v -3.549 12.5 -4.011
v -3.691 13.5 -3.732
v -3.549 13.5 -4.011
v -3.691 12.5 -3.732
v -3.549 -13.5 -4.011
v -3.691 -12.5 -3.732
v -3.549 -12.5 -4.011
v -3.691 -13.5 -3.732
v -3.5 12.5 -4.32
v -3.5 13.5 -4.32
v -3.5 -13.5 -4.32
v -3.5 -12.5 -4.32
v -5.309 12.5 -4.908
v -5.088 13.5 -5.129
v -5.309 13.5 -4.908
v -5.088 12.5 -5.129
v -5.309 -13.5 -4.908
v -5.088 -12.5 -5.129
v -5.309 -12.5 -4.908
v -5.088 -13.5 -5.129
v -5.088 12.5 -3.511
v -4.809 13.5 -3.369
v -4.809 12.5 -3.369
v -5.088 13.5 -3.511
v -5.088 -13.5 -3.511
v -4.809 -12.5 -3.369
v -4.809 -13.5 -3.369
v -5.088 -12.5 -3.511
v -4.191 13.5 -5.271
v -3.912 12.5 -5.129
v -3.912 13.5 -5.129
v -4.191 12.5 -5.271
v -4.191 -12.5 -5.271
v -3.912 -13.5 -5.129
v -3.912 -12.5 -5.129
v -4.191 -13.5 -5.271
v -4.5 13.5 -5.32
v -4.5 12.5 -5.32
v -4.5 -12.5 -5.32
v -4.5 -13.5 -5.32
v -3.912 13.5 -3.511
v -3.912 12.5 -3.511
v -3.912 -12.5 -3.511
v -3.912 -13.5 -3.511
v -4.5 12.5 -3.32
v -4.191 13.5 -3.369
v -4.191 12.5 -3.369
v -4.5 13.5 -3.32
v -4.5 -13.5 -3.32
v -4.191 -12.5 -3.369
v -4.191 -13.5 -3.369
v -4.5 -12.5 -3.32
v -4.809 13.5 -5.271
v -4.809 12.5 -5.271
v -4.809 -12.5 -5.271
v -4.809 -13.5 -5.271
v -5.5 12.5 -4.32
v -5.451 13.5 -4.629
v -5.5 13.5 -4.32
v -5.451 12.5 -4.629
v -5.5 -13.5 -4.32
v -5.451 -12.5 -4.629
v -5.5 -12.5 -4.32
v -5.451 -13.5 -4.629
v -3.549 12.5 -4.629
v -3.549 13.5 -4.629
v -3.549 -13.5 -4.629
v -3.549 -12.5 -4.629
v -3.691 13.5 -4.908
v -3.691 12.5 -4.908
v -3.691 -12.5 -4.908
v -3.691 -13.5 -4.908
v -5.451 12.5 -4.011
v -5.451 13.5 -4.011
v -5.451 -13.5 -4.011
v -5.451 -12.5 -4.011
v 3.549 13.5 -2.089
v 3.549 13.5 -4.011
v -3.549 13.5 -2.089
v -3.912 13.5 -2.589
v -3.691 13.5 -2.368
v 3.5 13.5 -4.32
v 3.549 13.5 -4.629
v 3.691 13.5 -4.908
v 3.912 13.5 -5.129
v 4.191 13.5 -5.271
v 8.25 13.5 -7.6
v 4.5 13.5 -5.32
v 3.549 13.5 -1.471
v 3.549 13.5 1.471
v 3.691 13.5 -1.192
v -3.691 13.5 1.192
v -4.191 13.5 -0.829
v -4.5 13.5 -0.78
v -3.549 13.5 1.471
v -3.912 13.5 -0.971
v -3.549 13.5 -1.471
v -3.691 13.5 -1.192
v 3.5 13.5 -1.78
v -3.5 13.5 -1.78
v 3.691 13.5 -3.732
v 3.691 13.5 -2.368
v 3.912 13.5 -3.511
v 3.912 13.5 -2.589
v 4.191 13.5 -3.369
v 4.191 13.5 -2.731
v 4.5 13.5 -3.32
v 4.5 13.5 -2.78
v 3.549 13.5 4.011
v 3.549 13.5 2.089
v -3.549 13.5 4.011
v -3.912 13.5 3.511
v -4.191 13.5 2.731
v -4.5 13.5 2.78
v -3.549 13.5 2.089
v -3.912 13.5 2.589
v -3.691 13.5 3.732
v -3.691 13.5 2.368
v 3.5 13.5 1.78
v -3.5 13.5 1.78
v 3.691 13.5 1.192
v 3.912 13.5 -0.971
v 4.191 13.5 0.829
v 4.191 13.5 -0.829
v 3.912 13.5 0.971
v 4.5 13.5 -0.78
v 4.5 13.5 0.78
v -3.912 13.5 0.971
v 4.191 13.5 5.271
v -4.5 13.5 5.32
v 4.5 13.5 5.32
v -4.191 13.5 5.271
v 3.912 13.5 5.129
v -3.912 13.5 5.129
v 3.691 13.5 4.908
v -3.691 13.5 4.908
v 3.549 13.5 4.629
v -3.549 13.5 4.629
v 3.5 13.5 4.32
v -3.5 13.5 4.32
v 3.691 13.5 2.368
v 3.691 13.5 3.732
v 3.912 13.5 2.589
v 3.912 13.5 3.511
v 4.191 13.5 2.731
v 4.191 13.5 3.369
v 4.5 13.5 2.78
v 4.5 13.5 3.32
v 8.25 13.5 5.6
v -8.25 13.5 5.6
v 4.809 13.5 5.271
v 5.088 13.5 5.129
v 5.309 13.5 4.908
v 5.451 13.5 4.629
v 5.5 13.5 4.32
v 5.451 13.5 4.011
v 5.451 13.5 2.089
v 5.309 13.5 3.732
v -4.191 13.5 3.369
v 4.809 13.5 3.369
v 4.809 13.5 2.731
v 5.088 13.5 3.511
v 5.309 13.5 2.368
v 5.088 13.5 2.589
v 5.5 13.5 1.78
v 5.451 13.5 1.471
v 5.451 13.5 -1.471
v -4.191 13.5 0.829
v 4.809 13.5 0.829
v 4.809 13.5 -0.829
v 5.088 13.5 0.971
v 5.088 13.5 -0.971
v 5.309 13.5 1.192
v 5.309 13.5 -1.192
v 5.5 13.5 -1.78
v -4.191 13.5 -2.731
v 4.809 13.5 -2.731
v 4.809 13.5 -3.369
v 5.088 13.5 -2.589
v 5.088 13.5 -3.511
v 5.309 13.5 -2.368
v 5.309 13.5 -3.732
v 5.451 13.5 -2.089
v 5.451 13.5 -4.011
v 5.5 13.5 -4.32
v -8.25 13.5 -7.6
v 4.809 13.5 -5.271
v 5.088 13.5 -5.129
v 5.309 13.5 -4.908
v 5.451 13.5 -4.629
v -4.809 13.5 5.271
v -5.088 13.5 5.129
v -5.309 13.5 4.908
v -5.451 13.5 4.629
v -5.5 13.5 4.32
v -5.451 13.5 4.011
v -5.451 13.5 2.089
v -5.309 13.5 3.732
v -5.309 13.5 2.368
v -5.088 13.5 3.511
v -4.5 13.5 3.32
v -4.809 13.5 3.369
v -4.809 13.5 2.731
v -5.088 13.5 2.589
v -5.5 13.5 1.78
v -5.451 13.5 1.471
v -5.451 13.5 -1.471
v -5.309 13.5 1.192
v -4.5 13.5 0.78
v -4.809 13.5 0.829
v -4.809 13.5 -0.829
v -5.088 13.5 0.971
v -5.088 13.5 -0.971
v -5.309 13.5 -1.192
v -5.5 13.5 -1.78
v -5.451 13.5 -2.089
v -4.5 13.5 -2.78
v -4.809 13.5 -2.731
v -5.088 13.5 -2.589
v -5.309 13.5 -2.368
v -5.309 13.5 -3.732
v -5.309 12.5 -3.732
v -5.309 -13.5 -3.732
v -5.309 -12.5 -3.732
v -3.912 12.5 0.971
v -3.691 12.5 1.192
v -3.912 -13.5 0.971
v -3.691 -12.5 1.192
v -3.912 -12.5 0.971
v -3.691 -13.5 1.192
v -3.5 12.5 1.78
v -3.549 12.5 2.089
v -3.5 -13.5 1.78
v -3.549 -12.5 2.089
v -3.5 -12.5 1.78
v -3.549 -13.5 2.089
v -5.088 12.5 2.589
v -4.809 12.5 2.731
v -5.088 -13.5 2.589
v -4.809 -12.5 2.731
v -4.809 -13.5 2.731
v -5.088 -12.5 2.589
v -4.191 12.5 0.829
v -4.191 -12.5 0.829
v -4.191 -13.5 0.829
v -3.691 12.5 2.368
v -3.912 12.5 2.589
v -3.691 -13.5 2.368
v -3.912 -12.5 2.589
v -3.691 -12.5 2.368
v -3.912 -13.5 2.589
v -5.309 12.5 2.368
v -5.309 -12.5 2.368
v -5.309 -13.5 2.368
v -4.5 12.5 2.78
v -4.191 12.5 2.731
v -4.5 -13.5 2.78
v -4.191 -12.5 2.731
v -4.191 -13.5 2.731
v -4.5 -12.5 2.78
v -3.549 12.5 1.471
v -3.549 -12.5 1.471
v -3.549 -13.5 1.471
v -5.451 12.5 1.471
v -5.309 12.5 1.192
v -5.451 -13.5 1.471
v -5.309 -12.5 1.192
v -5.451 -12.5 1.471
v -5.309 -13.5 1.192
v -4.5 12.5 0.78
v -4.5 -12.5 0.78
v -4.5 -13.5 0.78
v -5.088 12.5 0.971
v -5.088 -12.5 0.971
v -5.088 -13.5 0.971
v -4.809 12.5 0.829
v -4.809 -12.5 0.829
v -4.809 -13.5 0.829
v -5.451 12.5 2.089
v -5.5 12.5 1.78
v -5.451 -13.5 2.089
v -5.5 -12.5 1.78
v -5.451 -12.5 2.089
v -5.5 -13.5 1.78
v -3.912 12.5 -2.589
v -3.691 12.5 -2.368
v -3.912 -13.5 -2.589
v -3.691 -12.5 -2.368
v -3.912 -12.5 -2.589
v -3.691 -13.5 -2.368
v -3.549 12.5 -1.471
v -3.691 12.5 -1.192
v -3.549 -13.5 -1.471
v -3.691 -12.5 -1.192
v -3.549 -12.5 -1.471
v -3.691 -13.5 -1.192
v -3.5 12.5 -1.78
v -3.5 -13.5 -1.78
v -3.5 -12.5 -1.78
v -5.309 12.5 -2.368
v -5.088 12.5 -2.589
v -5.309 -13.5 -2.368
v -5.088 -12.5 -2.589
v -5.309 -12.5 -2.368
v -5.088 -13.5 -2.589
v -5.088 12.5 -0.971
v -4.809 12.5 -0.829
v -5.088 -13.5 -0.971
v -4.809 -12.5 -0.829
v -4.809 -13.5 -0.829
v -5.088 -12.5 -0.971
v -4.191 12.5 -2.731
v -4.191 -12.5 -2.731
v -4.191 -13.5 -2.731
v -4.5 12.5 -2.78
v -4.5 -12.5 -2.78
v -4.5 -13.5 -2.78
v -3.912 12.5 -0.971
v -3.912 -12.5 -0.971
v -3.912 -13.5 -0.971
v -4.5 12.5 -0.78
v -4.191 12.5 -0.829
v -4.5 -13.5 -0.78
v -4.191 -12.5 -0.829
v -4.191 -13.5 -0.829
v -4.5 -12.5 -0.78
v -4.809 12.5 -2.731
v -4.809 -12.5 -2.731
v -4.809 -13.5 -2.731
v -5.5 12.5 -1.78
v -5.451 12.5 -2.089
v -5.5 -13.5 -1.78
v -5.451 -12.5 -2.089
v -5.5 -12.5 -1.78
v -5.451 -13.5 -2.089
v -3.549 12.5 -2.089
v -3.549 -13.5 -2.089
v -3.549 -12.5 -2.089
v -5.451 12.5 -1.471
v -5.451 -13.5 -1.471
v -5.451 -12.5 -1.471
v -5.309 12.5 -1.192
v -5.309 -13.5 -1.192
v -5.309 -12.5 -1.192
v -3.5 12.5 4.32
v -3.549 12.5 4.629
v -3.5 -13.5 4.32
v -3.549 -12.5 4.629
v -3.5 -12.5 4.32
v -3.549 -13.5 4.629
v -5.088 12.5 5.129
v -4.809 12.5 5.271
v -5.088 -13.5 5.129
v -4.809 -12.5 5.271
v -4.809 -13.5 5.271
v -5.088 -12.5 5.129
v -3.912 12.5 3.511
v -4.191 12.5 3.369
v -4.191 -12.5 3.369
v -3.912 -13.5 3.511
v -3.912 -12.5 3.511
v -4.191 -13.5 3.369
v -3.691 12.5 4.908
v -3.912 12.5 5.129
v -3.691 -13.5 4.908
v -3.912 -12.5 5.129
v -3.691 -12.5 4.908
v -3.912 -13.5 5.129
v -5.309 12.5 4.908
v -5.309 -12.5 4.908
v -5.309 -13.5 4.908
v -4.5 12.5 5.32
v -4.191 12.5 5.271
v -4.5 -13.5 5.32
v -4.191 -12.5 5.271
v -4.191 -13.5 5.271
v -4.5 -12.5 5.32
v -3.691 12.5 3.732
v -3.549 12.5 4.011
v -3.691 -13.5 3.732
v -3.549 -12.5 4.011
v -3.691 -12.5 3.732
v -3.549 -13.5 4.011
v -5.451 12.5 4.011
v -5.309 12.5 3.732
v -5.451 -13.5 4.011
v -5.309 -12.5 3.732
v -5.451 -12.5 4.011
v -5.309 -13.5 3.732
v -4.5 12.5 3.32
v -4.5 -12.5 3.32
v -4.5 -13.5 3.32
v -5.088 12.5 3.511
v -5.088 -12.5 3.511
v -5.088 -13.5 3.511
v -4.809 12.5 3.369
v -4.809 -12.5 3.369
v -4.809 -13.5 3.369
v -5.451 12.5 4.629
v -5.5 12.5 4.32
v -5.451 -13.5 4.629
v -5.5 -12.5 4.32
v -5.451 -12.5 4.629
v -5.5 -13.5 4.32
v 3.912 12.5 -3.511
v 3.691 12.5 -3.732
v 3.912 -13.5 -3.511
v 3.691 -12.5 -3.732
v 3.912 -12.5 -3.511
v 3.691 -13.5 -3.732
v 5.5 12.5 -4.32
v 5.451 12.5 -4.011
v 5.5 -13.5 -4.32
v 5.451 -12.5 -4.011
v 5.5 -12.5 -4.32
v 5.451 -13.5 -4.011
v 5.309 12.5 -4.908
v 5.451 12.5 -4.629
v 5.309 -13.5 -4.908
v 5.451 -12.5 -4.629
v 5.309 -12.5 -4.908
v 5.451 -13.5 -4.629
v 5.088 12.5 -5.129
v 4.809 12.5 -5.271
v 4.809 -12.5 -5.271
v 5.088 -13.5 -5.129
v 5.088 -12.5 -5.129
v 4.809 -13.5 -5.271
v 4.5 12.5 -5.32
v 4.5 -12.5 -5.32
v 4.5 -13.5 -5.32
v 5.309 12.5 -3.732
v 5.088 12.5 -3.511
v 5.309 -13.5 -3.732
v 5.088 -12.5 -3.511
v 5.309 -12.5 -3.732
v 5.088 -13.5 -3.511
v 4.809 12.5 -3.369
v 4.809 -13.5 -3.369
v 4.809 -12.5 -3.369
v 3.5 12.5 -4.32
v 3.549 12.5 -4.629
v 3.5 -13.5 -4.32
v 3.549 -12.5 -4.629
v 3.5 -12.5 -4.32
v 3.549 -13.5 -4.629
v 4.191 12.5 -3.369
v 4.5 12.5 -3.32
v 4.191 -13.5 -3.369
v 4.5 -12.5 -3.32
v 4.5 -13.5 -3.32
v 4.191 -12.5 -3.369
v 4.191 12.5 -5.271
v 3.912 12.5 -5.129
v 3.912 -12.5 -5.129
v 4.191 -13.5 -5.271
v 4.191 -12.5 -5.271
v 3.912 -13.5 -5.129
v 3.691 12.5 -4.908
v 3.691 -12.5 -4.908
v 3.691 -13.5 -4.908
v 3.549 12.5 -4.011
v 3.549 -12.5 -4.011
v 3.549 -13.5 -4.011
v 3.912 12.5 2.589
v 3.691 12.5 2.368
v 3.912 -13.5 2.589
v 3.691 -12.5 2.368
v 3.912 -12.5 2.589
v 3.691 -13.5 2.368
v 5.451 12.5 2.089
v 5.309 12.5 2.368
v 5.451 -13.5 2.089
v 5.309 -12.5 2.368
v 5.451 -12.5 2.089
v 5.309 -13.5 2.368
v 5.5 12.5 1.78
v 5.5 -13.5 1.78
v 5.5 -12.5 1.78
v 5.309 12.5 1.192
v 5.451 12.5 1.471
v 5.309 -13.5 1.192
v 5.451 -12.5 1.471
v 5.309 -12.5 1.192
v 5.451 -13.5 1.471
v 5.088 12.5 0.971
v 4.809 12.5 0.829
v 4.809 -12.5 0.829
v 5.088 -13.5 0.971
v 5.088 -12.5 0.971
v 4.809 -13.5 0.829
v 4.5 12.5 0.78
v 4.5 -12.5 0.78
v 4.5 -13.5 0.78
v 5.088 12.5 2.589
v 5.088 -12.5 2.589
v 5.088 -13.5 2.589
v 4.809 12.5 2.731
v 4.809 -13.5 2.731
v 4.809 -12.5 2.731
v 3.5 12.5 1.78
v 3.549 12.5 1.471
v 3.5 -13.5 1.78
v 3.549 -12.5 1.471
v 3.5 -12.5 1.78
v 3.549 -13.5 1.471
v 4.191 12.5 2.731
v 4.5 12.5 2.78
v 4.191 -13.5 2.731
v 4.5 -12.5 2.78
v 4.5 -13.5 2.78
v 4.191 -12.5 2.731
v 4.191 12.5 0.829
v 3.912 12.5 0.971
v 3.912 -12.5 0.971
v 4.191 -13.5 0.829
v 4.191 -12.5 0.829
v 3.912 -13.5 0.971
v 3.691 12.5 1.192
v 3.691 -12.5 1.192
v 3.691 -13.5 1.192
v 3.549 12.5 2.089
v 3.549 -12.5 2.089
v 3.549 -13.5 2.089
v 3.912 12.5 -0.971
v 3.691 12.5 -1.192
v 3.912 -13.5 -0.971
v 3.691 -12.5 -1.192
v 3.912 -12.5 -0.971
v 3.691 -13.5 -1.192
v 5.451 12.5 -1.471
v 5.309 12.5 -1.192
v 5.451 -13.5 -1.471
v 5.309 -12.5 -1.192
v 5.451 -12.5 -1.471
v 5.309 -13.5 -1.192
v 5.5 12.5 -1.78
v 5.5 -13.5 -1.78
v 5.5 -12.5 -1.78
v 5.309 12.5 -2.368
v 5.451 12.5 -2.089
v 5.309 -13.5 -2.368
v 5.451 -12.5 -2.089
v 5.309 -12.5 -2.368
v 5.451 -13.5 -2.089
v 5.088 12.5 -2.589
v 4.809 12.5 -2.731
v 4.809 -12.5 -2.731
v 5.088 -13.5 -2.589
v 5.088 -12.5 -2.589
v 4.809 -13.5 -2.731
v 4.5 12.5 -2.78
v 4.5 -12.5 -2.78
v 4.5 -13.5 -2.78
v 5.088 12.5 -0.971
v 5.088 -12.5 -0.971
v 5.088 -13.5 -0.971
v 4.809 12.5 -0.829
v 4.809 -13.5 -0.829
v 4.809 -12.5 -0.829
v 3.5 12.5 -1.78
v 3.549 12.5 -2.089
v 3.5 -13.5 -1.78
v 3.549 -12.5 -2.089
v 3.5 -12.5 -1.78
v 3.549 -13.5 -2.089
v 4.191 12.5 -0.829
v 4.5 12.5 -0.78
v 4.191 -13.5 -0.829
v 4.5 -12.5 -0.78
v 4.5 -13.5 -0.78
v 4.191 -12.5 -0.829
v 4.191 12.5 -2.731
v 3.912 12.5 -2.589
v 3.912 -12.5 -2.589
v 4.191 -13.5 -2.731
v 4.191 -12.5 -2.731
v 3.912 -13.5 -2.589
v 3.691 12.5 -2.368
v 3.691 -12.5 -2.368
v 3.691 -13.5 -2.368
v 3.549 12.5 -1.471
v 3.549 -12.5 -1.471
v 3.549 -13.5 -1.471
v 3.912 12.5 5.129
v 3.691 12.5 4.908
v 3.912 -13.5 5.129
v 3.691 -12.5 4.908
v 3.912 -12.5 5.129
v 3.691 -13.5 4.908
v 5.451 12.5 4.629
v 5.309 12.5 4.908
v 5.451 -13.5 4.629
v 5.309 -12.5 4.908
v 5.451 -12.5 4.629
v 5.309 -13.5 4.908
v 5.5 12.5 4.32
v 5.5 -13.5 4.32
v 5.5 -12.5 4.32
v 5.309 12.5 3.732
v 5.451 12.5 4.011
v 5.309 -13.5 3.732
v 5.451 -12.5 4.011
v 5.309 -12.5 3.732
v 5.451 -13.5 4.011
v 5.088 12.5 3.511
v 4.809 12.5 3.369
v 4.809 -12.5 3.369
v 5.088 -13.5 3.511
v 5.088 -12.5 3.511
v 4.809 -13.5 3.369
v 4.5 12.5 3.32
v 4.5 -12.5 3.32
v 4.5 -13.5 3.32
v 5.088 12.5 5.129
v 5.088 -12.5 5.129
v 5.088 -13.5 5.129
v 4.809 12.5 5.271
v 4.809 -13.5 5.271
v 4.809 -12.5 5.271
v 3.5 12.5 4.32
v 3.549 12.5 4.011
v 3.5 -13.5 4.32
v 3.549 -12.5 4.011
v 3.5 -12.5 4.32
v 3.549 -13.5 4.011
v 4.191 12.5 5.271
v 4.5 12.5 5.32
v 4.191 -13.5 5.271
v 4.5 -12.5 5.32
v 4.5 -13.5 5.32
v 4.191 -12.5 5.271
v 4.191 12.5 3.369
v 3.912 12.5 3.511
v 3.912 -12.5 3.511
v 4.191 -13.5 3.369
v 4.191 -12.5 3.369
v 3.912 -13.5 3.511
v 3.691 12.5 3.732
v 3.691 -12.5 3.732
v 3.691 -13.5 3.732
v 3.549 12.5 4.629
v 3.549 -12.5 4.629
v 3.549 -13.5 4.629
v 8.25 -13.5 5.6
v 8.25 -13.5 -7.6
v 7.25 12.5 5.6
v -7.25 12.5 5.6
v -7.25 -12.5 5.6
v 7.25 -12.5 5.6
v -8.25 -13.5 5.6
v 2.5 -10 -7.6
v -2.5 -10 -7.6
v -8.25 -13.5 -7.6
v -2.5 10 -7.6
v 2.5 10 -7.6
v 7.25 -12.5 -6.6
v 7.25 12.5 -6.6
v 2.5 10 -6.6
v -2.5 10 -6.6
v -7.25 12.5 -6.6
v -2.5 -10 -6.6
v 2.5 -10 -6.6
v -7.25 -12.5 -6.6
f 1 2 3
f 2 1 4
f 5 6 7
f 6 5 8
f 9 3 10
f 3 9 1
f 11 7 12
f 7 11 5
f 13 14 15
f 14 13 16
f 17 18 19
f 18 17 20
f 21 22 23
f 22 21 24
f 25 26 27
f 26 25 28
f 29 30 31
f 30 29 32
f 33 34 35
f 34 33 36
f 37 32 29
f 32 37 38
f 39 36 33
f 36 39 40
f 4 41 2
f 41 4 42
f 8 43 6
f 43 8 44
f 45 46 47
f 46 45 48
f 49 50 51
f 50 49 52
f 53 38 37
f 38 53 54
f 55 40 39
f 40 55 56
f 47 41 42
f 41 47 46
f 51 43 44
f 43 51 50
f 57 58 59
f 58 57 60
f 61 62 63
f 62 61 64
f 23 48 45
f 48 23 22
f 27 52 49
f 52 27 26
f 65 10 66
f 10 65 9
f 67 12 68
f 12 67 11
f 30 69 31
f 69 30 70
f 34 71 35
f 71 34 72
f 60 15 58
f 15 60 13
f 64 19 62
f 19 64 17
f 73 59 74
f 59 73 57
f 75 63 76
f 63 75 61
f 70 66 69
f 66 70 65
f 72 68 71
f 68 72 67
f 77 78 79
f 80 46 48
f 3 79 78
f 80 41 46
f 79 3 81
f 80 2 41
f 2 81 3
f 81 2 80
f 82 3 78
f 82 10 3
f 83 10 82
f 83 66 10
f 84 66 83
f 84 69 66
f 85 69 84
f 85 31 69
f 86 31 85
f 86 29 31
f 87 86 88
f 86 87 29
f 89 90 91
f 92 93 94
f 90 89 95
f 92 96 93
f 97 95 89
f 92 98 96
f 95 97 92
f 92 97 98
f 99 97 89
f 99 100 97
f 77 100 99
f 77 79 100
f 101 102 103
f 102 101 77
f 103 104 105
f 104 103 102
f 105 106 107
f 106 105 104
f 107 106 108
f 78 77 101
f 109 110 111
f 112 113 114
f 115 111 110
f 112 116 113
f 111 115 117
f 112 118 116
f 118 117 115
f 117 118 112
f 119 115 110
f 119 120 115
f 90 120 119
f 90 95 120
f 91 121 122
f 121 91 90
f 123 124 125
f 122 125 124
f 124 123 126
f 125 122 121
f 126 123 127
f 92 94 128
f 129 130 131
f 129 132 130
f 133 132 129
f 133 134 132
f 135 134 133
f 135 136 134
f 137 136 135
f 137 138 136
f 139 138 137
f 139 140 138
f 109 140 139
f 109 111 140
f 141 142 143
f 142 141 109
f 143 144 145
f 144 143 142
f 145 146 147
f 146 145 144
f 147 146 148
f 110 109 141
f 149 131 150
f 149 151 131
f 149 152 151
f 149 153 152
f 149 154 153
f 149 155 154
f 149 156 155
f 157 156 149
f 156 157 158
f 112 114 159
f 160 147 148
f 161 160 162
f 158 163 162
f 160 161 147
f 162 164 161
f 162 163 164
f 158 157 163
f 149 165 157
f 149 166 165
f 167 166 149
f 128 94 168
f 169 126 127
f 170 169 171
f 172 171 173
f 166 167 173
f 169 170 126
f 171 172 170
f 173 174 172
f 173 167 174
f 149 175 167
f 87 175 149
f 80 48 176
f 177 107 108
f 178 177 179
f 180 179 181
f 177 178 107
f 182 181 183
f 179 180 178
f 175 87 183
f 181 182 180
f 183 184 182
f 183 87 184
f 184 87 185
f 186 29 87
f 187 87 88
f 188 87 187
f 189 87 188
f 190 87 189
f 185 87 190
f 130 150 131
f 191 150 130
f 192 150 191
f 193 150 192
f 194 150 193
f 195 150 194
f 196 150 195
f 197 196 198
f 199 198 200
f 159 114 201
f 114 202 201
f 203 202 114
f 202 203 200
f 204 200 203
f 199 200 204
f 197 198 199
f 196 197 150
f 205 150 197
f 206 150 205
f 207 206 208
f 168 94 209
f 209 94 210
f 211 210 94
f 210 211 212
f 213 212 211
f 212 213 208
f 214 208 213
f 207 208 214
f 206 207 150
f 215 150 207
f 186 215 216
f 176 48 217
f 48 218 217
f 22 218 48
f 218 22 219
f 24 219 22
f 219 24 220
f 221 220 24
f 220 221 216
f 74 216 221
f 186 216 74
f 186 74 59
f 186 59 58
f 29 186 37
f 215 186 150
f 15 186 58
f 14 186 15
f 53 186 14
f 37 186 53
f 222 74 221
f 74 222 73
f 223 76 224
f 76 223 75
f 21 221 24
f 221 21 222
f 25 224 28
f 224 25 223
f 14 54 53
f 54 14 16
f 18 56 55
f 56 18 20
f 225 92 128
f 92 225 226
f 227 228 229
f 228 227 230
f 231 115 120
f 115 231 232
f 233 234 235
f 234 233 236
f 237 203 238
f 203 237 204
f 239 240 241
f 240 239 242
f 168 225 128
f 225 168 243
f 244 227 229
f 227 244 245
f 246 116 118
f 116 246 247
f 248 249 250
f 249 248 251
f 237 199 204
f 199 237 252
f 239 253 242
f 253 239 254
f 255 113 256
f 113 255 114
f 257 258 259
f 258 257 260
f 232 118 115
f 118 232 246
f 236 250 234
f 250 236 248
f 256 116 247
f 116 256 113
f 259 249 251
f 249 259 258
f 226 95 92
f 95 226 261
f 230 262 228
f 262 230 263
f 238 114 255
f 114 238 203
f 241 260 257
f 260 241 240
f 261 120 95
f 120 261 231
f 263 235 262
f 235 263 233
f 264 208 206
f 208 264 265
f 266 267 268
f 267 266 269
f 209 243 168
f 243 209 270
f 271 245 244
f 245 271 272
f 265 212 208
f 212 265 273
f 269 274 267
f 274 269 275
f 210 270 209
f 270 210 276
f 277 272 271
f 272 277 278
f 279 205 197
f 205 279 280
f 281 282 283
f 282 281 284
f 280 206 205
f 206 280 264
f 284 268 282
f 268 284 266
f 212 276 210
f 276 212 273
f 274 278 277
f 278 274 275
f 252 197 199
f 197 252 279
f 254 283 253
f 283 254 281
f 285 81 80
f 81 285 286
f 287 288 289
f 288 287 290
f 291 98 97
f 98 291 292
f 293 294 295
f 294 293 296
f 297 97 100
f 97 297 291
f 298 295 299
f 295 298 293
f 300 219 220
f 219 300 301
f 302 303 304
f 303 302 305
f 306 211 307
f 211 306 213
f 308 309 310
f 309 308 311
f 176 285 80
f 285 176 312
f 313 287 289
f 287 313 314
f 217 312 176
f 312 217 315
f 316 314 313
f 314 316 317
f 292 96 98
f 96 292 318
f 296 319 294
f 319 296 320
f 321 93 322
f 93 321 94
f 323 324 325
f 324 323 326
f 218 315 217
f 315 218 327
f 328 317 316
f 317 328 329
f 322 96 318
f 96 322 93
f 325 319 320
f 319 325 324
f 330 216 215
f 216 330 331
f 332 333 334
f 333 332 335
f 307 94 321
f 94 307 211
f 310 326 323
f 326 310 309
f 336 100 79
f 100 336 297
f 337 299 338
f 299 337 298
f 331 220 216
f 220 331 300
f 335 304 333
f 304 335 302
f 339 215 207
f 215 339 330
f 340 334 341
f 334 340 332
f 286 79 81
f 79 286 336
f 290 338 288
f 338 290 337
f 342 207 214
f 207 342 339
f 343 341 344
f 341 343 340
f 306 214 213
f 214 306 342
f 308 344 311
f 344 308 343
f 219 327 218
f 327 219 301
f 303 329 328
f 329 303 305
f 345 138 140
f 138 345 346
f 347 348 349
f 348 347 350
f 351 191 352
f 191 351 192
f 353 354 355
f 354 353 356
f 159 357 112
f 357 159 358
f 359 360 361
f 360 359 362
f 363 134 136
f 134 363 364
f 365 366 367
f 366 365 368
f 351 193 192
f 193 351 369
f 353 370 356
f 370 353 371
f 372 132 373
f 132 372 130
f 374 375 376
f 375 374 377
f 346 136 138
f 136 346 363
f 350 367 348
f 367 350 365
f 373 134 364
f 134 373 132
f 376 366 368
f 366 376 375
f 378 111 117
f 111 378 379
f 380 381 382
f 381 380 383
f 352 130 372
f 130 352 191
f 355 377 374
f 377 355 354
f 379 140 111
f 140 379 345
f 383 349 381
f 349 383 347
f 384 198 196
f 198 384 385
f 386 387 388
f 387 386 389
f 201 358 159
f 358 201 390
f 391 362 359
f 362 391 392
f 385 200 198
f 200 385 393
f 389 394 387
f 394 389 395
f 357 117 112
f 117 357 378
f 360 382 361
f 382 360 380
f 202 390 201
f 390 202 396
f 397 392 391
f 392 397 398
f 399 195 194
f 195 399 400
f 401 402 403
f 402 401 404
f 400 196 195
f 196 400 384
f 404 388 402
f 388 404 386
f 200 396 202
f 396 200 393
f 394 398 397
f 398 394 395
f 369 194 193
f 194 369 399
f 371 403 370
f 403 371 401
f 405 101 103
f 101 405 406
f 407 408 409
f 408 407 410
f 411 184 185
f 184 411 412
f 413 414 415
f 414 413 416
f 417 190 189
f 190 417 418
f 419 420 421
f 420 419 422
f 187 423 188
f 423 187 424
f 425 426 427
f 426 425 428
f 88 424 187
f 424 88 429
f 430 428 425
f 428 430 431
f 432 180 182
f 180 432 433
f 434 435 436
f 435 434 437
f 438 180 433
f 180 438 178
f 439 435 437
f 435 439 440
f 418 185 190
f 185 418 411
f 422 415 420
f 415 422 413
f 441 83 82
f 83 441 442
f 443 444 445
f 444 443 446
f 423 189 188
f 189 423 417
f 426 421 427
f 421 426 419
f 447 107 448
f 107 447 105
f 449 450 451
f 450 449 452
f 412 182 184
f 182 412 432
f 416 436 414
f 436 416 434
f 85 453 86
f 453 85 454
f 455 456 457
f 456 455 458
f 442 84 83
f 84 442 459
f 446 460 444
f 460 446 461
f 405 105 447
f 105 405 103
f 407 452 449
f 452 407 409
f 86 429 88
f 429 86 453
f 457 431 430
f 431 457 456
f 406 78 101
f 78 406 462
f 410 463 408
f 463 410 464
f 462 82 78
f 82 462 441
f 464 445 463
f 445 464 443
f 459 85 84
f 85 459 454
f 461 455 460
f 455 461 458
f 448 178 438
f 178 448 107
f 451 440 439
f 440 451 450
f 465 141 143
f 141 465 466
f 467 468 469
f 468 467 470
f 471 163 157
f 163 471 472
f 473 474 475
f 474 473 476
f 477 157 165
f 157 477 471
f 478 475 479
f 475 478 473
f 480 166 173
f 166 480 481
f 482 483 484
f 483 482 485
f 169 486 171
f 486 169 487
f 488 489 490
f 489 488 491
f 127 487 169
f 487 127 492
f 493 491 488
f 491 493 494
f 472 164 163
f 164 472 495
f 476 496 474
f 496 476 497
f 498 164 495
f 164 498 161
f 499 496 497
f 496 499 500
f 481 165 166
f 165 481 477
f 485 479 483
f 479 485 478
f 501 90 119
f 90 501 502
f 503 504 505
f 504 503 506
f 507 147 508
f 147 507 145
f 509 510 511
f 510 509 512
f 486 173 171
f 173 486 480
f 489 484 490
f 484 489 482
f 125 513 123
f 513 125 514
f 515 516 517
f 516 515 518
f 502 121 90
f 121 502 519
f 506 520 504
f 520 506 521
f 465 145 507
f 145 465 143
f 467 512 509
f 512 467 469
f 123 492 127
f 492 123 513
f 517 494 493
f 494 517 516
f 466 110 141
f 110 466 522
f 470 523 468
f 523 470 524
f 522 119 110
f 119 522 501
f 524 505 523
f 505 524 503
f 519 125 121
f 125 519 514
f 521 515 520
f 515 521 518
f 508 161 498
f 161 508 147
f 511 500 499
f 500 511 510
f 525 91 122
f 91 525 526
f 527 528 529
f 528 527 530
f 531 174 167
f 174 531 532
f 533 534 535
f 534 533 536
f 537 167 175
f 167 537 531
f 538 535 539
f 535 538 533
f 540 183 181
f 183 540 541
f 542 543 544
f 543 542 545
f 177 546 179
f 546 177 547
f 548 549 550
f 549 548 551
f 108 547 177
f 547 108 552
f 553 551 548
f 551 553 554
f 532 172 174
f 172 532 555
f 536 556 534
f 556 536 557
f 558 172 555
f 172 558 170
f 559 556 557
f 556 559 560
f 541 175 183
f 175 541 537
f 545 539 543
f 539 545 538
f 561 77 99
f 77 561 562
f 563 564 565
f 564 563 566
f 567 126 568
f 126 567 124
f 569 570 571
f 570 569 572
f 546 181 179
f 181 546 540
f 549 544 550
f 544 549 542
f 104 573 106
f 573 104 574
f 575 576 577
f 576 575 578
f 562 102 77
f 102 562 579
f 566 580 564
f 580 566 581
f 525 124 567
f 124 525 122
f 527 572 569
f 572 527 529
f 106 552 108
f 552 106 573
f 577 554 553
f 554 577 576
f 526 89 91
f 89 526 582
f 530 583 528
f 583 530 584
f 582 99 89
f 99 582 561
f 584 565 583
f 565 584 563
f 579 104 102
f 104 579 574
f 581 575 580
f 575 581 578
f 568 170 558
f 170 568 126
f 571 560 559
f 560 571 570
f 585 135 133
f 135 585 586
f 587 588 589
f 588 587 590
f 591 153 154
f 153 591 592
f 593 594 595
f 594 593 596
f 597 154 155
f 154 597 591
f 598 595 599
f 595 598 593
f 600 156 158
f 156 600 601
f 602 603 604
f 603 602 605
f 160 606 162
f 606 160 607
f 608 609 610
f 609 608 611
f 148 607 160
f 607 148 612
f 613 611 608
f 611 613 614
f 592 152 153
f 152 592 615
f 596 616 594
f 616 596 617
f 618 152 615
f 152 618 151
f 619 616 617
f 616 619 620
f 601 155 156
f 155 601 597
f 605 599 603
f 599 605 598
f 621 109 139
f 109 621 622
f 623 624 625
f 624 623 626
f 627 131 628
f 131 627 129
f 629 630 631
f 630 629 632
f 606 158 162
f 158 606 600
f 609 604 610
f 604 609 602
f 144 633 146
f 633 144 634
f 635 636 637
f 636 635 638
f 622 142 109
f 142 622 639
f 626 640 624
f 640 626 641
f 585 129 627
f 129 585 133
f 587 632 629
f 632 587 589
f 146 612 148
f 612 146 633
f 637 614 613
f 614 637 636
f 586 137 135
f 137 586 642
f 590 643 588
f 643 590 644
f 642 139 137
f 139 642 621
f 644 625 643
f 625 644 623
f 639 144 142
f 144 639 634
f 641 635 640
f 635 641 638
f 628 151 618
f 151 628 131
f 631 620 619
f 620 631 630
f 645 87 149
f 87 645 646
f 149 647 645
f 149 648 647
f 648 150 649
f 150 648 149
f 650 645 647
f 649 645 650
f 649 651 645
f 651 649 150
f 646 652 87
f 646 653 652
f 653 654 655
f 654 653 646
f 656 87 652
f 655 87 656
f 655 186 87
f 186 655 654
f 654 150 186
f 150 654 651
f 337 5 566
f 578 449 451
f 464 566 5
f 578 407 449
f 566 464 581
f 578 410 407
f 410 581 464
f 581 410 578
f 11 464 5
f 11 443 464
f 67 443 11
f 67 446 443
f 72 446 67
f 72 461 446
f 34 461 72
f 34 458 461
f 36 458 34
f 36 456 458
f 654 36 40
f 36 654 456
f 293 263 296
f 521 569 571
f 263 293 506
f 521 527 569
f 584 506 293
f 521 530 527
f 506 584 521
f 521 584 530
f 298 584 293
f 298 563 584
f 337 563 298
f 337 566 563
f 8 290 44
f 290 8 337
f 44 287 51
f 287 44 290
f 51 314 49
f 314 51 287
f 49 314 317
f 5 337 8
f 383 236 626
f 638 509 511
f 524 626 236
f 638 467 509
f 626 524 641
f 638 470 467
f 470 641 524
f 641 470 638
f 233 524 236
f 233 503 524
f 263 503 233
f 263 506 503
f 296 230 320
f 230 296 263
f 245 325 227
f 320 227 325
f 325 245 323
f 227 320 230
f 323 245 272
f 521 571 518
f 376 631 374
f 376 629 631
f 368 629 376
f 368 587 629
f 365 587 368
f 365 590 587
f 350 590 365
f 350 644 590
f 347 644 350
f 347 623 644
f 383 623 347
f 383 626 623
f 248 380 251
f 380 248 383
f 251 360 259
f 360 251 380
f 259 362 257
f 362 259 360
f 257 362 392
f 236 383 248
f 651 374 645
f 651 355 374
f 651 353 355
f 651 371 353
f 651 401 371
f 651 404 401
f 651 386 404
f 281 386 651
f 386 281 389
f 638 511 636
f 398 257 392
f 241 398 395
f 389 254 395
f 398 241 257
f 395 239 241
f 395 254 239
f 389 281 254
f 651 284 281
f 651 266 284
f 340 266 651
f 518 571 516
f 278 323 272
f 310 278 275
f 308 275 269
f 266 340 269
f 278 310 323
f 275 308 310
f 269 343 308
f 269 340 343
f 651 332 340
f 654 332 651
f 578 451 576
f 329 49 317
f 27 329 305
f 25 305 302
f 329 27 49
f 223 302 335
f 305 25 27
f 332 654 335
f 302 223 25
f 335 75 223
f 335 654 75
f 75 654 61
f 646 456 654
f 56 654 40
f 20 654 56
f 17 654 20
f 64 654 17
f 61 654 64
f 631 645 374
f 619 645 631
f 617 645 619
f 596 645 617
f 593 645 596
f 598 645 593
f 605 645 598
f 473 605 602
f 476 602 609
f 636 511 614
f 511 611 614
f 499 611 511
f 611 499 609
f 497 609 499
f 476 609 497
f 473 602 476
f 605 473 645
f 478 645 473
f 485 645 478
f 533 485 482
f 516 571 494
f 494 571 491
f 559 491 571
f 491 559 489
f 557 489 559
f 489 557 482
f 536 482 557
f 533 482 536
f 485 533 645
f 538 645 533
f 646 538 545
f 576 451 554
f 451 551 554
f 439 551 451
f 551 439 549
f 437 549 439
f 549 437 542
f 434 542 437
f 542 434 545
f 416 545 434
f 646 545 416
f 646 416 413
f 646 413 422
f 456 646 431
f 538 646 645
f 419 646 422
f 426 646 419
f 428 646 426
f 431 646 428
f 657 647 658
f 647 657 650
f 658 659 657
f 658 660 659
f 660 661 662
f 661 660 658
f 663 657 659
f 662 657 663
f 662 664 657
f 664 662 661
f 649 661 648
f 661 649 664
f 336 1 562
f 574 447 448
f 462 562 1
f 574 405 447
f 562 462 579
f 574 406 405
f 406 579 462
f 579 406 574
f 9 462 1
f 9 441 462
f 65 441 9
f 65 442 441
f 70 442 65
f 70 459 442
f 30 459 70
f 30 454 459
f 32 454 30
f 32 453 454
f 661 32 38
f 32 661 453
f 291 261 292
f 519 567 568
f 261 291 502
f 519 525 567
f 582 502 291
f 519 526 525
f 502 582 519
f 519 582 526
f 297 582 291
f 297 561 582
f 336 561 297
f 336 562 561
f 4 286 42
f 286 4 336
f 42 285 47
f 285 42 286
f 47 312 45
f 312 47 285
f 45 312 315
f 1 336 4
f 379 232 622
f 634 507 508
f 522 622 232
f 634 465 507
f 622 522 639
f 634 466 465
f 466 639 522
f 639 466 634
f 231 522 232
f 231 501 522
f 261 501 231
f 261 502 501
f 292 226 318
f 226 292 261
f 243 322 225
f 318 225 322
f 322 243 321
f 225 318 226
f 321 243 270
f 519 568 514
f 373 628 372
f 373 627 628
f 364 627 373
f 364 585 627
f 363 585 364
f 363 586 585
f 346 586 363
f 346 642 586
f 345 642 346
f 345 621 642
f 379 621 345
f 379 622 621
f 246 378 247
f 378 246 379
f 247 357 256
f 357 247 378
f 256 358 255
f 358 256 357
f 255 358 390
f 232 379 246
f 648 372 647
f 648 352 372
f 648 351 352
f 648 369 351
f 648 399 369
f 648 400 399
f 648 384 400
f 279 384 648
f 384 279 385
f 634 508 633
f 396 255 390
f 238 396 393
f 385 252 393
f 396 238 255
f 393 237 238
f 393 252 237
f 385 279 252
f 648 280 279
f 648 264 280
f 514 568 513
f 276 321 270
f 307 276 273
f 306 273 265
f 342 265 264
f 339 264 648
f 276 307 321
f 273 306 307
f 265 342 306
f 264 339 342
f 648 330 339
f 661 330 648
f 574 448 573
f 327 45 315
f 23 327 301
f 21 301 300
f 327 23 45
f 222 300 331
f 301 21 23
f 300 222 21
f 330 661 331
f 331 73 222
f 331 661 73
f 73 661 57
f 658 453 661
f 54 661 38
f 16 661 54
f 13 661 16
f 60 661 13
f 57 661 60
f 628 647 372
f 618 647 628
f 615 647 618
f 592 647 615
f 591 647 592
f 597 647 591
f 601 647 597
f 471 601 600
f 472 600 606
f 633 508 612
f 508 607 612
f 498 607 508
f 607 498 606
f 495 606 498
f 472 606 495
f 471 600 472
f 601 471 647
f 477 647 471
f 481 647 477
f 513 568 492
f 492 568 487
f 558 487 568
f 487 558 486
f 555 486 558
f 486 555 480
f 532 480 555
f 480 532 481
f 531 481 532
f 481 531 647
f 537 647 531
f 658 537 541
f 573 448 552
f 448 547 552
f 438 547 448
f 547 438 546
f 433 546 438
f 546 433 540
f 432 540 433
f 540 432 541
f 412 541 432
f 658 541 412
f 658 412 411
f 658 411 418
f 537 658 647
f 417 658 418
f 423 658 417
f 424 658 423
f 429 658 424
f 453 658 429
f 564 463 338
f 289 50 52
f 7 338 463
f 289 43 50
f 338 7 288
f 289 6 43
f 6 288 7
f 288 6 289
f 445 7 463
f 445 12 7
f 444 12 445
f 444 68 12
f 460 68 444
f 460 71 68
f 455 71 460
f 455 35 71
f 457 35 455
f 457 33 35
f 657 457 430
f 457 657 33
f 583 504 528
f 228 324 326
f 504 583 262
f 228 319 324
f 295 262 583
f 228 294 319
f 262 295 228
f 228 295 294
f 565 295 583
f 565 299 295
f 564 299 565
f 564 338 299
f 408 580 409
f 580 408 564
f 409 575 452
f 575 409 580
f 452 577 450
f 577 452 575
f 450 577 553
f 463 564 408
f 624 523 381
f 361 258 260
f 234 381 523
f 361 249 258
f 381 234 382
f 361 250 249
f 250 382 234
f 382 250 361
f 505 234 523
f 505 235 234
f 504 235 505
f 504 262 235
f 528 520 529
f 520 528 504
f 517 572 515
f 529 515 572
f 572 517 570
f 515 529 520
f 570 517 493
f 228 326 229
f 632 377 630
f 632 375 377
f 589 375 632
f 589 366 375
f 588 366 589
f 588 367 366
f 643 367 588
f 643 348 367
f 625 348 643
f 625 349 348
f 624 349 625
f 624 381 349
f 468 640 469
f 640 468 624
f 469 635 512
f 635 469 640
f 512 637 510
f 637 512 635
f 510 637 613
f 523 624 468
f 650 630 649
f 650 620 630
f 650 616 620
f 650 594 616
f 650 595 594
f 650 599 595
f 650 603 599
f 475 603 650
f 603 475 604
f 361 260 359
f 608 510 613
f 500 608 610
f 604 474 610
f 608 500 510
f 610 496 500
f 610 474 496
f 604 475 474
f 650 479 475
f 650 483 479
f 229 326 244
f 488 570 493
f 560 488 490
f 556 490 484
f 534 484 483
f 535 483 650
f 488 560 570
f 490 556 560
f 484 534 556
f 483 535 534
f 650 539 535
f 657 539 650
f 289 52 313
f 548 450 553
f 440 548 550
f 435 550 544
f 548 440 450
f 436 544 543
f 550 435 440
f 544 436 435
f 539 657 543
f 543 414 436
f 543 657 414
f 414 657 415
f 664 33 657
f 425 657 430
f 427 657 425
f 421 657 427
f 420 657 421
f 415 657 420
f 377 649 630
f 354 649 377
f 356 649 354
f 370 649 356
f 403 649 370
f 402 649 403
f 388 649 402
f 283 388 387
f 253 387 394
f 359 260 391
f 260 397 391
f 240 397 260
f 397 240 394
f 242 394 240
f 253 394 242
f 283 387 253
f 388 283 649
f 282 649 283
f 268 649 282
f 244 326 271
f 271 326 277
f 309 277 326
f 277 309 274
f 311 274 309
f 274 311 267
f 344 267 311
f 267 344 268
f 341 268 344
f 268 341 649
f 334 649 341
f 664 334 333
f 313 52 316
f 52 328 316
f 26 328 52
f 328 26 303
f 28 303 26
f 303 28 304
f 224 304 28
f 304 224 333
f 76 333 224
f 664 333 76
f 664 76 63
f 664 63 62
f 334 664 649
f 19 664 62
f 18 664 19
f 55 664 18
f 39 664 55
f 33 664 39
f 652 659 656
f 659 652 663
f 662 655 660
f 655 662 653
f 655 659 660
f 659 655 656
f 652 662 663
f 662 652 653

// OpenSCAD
$fn=20;

X=14+2*1+0.5;
Y=25+2*1;
Z=6.1*2+1;
E=1;
F=9+2*1;
RT=1;
XT=9/2;
ZT=2.54/2;
DZ=E;

difference() {
	translate([0,0, -E]) cube([X,Y,Z],center=true);
	translate([0,0,0]) cube([X-2*E,Y-2*E,Z],center=true);
	translate([0,0,-Z/2]) cube([5,20,Z],center=true);
	for (i=[-1,1], j=[-1,1], k=[-1,1]) {
		translate([i*XT,Y/2,j*ZT+k*6.1/2]) rotate([90,0,0]) cylinder(r=RT,h=Y+2);
	}	
}
